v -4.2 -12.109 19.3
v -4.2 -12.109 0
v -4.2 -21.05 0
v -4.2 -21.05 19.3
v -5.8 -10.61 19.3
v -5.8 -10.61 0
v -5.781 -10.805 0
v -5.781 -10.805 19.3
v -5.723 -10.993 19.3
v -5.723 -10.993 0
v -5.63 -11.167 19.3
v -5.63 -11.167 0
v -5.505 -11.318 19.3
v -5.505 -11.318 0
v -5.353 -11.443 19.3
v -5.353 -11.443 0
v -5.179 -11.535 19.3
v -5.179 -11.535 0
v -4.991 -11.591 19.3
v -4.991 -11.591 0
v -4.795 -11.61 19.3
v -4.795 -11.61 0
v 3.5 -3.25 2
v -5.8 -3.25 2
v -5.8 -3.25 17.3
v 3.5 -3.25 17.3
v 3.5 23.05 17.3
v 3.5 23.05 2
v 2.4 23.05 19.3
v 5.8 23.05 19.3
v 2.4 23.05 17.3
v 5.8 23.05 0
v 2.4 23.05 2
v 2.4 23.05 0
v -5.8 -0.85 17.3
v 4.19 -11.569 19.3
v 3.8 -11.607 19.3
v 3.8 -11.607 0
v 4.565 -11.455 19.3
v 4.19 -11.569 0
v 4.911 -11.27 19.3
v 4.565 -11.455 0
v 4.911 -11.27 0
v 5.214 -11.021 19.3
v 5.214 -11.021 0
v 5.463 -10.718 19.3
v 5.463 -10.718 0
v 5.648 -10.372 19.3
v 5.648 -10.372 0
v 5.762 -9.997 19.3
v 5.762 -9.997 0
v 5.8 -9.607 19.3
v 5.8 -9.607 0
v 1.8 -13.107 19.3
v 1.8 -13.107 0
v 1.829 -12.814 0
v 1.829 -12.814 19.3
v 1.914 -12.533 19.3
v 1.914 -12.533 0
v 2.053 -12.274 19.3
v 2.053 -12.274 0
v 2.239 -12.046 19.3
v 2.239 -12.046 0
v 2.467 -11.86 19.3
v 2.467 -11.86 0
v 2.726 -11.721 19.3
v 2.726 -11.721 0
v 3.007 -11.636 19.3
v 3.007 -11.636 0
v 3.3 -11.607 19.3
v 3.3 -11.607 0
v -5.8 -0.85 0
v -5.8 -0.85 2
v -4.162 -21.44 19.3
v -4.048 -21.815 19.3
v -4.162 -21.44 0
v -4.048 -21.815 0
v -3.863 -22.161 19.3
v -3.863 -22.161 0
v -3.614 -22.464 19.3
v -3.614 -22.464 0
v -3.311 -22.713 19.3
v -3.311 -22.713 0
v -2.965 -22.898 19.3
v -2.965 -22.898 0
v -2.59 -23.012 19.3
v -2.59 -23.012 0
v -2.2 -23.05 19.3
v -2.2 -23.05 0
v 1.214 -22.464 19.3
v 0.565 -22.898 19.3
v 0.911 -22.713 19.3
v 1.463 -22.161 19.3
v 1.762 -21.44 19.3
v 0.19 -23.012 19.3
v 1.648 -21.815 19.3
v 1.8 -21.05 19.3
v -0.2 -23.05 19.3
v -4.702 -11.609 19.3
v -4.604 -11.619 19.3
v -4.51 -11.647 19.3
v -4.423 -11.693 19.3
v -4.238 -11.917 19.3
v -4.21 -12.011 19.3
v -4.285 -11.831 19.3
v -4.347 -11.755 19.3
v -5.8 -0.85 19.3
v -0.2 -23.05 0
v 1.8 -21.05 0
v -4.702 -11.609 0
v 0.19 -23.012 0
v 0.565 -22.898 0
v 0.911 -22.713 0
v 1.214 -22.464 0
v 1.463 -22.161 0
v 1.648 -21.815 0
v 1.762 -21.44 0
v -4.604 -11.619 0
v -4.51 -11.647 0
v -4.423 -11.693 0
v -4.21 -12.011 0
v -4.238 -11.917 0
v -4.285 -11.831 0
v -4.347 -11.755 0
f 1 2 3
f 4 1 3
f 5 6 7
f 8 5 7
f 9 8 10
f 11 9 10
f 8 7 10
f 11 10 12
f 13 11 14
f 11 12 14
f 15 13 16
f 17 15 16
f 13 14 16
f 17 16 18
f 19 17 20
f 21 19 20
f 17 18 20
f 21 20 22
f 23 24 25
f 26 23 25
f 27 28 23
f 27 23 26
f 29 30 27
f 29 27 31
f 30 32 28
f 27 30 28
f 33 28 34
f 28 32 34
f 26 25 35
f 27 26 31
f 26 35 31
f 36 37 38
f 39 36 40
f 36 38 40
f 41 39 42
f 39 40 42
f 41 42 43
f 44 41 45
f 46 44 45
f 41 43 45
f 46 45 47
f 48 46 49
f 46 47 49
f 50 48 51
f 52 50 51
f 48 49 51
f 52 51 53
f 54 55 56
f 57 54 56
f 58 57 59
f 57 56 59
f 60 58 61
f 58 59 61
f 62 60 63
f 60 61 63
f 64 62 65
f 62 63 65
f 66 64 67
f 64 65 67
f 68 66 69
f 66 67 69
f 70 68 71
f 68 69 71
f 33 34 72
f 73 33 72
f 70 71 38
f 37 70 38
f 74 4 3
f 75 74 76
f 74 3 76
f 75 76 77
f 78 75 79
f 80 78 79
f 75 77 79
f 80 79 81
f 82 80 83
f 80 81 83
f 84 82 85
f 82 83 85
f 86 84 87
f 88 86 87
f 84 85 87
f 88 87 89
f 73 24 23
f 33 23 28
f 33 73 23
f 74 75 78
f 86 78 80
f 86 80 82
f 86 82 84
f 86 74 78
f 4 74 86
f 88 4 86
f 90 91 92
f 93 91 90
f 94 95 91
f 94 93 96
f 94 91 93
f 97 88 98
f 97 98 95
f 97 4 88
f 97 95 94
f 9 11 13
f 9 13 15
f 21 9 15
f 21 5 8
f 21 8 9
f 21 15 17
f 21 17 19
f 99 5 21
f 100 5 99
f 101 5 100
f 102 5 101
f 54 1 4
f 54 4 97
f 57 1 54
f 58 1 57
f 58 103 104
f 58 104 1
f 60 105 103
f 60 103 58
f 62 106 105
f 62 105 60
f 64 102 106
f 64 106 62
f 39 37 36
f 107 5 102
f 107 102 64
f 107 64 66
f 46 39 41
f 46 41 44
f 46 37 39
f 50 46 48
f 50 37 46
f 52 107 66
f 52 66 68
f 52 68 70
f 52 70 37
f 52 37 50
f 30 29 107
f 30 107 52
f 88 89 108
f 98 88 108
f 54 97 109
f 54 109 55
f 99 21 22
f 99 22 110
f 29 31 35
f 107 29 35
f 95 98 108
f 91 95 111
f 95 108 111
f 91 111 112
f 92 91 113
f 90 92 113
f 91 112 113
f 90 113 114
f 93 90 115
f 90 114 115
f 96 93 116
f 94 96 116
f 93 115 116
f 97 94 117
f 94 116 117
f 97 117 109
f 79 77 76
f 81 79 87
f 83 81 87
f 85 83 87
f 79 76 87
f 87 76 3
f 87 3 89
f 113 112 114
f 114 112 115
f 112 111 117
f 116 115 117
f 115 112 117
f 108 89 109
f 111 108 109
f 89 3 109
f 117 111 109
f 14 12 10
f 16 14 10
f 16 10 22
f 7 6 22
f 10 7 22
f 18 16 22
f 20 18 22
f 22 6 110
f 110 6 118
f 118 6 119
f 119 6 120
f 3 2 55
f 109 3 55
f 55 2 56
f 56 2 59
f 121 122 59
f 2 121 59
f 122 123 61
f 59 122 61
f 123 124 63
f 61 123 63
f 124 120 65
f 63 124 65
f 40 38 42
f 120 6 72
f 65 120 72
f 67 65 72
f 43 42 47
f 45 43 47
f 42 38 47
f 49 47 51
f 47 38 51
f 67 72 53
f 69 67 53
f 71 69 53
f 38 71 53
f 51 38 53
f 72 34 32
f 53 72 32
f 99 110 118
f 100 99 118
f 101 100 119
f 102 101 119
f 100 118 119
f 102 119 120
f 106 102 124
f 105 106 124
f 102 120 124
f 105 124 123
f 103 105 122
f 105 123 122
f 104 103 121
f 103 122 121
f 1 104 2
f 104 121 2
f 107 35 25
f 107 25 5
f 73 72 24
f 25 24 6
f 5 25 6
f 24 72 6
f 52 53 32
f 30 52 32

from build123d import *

# Parameters (mm, degrees)
SALIENTE_EXTRUIR1_DEPTH = 19.3
CROQUIS2_W              = 15.3
CROQUIS2_H              = 26.3
CORTAR_EXTRUIR1_DEPTH   = 9.3


with BuildPart() as part:
    # Croquis1 → Saliente-Extruir1 (new body)
    with BuildSketch(Plane.XY):
        with BuildLine():
            Line((5.8, 23.05), (2.4, 23.05))
            Line((2.4, 23.05), (-5.8, -0.85))
            Line((-5.8, -0.85), (-5.8, -10.609737321))
            ThreePointArc((-5.8, -10.609737321), (-5.505459406, -11.318487649), (-4.795345946, -11.609726491))
            Line((-4.795345946, -11.609726491), (-4.702327027, -11.609293571))
            ThreePointArc((-4.702327027, -11.609293571), (-4.347270297, -11.754912992), (-4.2, -12.109288156))
            Line((-4.2, -12.109288156), (-4.2, -21.05))
            ThreePointArc((-4.2, -21.05), (-3.614213562, -22.464213562), (-2.2, -23.05))
            Line((-2.2, -23.05), (-0.2, -23.05))
            ThreePointArc((-0.2, -23.05), (1.214213562, -22.464213562), (1.8, -21.05))
            Line((1.8, -21.05), (1.8, -13.106955688))
            ThreePointArc((1.8, -13.106955688), (2.239339828, -12.046295517), (3.3, -11.606955688))
            Line((3.3, -11.606955688), (3.8, -11.606955688))
            ThreePointArc((3.8, -11.606955688), (5.214213562, -11.021169251), (5.8, -9.606955688))
            Line((5.8, -9.606955688), (5.8, 23.05))
        make_face()
    extrude(amount=SALIENTE_EXTRUIR1_DEPTH)

    # Croquis2 → Cortar-Extruir1 (cut)
    with BuildSketch(Plane.ZY.offset(5.8)):
        with Locations((9.65, 9.9)):
            Rectangle(CROQUIS2_W, CROQUIS2_H)
    extrude(amount=-CORTAR_EXTRUIR1_DEPTH, mode=Mode.SUBTRACT)


solid = part.part
